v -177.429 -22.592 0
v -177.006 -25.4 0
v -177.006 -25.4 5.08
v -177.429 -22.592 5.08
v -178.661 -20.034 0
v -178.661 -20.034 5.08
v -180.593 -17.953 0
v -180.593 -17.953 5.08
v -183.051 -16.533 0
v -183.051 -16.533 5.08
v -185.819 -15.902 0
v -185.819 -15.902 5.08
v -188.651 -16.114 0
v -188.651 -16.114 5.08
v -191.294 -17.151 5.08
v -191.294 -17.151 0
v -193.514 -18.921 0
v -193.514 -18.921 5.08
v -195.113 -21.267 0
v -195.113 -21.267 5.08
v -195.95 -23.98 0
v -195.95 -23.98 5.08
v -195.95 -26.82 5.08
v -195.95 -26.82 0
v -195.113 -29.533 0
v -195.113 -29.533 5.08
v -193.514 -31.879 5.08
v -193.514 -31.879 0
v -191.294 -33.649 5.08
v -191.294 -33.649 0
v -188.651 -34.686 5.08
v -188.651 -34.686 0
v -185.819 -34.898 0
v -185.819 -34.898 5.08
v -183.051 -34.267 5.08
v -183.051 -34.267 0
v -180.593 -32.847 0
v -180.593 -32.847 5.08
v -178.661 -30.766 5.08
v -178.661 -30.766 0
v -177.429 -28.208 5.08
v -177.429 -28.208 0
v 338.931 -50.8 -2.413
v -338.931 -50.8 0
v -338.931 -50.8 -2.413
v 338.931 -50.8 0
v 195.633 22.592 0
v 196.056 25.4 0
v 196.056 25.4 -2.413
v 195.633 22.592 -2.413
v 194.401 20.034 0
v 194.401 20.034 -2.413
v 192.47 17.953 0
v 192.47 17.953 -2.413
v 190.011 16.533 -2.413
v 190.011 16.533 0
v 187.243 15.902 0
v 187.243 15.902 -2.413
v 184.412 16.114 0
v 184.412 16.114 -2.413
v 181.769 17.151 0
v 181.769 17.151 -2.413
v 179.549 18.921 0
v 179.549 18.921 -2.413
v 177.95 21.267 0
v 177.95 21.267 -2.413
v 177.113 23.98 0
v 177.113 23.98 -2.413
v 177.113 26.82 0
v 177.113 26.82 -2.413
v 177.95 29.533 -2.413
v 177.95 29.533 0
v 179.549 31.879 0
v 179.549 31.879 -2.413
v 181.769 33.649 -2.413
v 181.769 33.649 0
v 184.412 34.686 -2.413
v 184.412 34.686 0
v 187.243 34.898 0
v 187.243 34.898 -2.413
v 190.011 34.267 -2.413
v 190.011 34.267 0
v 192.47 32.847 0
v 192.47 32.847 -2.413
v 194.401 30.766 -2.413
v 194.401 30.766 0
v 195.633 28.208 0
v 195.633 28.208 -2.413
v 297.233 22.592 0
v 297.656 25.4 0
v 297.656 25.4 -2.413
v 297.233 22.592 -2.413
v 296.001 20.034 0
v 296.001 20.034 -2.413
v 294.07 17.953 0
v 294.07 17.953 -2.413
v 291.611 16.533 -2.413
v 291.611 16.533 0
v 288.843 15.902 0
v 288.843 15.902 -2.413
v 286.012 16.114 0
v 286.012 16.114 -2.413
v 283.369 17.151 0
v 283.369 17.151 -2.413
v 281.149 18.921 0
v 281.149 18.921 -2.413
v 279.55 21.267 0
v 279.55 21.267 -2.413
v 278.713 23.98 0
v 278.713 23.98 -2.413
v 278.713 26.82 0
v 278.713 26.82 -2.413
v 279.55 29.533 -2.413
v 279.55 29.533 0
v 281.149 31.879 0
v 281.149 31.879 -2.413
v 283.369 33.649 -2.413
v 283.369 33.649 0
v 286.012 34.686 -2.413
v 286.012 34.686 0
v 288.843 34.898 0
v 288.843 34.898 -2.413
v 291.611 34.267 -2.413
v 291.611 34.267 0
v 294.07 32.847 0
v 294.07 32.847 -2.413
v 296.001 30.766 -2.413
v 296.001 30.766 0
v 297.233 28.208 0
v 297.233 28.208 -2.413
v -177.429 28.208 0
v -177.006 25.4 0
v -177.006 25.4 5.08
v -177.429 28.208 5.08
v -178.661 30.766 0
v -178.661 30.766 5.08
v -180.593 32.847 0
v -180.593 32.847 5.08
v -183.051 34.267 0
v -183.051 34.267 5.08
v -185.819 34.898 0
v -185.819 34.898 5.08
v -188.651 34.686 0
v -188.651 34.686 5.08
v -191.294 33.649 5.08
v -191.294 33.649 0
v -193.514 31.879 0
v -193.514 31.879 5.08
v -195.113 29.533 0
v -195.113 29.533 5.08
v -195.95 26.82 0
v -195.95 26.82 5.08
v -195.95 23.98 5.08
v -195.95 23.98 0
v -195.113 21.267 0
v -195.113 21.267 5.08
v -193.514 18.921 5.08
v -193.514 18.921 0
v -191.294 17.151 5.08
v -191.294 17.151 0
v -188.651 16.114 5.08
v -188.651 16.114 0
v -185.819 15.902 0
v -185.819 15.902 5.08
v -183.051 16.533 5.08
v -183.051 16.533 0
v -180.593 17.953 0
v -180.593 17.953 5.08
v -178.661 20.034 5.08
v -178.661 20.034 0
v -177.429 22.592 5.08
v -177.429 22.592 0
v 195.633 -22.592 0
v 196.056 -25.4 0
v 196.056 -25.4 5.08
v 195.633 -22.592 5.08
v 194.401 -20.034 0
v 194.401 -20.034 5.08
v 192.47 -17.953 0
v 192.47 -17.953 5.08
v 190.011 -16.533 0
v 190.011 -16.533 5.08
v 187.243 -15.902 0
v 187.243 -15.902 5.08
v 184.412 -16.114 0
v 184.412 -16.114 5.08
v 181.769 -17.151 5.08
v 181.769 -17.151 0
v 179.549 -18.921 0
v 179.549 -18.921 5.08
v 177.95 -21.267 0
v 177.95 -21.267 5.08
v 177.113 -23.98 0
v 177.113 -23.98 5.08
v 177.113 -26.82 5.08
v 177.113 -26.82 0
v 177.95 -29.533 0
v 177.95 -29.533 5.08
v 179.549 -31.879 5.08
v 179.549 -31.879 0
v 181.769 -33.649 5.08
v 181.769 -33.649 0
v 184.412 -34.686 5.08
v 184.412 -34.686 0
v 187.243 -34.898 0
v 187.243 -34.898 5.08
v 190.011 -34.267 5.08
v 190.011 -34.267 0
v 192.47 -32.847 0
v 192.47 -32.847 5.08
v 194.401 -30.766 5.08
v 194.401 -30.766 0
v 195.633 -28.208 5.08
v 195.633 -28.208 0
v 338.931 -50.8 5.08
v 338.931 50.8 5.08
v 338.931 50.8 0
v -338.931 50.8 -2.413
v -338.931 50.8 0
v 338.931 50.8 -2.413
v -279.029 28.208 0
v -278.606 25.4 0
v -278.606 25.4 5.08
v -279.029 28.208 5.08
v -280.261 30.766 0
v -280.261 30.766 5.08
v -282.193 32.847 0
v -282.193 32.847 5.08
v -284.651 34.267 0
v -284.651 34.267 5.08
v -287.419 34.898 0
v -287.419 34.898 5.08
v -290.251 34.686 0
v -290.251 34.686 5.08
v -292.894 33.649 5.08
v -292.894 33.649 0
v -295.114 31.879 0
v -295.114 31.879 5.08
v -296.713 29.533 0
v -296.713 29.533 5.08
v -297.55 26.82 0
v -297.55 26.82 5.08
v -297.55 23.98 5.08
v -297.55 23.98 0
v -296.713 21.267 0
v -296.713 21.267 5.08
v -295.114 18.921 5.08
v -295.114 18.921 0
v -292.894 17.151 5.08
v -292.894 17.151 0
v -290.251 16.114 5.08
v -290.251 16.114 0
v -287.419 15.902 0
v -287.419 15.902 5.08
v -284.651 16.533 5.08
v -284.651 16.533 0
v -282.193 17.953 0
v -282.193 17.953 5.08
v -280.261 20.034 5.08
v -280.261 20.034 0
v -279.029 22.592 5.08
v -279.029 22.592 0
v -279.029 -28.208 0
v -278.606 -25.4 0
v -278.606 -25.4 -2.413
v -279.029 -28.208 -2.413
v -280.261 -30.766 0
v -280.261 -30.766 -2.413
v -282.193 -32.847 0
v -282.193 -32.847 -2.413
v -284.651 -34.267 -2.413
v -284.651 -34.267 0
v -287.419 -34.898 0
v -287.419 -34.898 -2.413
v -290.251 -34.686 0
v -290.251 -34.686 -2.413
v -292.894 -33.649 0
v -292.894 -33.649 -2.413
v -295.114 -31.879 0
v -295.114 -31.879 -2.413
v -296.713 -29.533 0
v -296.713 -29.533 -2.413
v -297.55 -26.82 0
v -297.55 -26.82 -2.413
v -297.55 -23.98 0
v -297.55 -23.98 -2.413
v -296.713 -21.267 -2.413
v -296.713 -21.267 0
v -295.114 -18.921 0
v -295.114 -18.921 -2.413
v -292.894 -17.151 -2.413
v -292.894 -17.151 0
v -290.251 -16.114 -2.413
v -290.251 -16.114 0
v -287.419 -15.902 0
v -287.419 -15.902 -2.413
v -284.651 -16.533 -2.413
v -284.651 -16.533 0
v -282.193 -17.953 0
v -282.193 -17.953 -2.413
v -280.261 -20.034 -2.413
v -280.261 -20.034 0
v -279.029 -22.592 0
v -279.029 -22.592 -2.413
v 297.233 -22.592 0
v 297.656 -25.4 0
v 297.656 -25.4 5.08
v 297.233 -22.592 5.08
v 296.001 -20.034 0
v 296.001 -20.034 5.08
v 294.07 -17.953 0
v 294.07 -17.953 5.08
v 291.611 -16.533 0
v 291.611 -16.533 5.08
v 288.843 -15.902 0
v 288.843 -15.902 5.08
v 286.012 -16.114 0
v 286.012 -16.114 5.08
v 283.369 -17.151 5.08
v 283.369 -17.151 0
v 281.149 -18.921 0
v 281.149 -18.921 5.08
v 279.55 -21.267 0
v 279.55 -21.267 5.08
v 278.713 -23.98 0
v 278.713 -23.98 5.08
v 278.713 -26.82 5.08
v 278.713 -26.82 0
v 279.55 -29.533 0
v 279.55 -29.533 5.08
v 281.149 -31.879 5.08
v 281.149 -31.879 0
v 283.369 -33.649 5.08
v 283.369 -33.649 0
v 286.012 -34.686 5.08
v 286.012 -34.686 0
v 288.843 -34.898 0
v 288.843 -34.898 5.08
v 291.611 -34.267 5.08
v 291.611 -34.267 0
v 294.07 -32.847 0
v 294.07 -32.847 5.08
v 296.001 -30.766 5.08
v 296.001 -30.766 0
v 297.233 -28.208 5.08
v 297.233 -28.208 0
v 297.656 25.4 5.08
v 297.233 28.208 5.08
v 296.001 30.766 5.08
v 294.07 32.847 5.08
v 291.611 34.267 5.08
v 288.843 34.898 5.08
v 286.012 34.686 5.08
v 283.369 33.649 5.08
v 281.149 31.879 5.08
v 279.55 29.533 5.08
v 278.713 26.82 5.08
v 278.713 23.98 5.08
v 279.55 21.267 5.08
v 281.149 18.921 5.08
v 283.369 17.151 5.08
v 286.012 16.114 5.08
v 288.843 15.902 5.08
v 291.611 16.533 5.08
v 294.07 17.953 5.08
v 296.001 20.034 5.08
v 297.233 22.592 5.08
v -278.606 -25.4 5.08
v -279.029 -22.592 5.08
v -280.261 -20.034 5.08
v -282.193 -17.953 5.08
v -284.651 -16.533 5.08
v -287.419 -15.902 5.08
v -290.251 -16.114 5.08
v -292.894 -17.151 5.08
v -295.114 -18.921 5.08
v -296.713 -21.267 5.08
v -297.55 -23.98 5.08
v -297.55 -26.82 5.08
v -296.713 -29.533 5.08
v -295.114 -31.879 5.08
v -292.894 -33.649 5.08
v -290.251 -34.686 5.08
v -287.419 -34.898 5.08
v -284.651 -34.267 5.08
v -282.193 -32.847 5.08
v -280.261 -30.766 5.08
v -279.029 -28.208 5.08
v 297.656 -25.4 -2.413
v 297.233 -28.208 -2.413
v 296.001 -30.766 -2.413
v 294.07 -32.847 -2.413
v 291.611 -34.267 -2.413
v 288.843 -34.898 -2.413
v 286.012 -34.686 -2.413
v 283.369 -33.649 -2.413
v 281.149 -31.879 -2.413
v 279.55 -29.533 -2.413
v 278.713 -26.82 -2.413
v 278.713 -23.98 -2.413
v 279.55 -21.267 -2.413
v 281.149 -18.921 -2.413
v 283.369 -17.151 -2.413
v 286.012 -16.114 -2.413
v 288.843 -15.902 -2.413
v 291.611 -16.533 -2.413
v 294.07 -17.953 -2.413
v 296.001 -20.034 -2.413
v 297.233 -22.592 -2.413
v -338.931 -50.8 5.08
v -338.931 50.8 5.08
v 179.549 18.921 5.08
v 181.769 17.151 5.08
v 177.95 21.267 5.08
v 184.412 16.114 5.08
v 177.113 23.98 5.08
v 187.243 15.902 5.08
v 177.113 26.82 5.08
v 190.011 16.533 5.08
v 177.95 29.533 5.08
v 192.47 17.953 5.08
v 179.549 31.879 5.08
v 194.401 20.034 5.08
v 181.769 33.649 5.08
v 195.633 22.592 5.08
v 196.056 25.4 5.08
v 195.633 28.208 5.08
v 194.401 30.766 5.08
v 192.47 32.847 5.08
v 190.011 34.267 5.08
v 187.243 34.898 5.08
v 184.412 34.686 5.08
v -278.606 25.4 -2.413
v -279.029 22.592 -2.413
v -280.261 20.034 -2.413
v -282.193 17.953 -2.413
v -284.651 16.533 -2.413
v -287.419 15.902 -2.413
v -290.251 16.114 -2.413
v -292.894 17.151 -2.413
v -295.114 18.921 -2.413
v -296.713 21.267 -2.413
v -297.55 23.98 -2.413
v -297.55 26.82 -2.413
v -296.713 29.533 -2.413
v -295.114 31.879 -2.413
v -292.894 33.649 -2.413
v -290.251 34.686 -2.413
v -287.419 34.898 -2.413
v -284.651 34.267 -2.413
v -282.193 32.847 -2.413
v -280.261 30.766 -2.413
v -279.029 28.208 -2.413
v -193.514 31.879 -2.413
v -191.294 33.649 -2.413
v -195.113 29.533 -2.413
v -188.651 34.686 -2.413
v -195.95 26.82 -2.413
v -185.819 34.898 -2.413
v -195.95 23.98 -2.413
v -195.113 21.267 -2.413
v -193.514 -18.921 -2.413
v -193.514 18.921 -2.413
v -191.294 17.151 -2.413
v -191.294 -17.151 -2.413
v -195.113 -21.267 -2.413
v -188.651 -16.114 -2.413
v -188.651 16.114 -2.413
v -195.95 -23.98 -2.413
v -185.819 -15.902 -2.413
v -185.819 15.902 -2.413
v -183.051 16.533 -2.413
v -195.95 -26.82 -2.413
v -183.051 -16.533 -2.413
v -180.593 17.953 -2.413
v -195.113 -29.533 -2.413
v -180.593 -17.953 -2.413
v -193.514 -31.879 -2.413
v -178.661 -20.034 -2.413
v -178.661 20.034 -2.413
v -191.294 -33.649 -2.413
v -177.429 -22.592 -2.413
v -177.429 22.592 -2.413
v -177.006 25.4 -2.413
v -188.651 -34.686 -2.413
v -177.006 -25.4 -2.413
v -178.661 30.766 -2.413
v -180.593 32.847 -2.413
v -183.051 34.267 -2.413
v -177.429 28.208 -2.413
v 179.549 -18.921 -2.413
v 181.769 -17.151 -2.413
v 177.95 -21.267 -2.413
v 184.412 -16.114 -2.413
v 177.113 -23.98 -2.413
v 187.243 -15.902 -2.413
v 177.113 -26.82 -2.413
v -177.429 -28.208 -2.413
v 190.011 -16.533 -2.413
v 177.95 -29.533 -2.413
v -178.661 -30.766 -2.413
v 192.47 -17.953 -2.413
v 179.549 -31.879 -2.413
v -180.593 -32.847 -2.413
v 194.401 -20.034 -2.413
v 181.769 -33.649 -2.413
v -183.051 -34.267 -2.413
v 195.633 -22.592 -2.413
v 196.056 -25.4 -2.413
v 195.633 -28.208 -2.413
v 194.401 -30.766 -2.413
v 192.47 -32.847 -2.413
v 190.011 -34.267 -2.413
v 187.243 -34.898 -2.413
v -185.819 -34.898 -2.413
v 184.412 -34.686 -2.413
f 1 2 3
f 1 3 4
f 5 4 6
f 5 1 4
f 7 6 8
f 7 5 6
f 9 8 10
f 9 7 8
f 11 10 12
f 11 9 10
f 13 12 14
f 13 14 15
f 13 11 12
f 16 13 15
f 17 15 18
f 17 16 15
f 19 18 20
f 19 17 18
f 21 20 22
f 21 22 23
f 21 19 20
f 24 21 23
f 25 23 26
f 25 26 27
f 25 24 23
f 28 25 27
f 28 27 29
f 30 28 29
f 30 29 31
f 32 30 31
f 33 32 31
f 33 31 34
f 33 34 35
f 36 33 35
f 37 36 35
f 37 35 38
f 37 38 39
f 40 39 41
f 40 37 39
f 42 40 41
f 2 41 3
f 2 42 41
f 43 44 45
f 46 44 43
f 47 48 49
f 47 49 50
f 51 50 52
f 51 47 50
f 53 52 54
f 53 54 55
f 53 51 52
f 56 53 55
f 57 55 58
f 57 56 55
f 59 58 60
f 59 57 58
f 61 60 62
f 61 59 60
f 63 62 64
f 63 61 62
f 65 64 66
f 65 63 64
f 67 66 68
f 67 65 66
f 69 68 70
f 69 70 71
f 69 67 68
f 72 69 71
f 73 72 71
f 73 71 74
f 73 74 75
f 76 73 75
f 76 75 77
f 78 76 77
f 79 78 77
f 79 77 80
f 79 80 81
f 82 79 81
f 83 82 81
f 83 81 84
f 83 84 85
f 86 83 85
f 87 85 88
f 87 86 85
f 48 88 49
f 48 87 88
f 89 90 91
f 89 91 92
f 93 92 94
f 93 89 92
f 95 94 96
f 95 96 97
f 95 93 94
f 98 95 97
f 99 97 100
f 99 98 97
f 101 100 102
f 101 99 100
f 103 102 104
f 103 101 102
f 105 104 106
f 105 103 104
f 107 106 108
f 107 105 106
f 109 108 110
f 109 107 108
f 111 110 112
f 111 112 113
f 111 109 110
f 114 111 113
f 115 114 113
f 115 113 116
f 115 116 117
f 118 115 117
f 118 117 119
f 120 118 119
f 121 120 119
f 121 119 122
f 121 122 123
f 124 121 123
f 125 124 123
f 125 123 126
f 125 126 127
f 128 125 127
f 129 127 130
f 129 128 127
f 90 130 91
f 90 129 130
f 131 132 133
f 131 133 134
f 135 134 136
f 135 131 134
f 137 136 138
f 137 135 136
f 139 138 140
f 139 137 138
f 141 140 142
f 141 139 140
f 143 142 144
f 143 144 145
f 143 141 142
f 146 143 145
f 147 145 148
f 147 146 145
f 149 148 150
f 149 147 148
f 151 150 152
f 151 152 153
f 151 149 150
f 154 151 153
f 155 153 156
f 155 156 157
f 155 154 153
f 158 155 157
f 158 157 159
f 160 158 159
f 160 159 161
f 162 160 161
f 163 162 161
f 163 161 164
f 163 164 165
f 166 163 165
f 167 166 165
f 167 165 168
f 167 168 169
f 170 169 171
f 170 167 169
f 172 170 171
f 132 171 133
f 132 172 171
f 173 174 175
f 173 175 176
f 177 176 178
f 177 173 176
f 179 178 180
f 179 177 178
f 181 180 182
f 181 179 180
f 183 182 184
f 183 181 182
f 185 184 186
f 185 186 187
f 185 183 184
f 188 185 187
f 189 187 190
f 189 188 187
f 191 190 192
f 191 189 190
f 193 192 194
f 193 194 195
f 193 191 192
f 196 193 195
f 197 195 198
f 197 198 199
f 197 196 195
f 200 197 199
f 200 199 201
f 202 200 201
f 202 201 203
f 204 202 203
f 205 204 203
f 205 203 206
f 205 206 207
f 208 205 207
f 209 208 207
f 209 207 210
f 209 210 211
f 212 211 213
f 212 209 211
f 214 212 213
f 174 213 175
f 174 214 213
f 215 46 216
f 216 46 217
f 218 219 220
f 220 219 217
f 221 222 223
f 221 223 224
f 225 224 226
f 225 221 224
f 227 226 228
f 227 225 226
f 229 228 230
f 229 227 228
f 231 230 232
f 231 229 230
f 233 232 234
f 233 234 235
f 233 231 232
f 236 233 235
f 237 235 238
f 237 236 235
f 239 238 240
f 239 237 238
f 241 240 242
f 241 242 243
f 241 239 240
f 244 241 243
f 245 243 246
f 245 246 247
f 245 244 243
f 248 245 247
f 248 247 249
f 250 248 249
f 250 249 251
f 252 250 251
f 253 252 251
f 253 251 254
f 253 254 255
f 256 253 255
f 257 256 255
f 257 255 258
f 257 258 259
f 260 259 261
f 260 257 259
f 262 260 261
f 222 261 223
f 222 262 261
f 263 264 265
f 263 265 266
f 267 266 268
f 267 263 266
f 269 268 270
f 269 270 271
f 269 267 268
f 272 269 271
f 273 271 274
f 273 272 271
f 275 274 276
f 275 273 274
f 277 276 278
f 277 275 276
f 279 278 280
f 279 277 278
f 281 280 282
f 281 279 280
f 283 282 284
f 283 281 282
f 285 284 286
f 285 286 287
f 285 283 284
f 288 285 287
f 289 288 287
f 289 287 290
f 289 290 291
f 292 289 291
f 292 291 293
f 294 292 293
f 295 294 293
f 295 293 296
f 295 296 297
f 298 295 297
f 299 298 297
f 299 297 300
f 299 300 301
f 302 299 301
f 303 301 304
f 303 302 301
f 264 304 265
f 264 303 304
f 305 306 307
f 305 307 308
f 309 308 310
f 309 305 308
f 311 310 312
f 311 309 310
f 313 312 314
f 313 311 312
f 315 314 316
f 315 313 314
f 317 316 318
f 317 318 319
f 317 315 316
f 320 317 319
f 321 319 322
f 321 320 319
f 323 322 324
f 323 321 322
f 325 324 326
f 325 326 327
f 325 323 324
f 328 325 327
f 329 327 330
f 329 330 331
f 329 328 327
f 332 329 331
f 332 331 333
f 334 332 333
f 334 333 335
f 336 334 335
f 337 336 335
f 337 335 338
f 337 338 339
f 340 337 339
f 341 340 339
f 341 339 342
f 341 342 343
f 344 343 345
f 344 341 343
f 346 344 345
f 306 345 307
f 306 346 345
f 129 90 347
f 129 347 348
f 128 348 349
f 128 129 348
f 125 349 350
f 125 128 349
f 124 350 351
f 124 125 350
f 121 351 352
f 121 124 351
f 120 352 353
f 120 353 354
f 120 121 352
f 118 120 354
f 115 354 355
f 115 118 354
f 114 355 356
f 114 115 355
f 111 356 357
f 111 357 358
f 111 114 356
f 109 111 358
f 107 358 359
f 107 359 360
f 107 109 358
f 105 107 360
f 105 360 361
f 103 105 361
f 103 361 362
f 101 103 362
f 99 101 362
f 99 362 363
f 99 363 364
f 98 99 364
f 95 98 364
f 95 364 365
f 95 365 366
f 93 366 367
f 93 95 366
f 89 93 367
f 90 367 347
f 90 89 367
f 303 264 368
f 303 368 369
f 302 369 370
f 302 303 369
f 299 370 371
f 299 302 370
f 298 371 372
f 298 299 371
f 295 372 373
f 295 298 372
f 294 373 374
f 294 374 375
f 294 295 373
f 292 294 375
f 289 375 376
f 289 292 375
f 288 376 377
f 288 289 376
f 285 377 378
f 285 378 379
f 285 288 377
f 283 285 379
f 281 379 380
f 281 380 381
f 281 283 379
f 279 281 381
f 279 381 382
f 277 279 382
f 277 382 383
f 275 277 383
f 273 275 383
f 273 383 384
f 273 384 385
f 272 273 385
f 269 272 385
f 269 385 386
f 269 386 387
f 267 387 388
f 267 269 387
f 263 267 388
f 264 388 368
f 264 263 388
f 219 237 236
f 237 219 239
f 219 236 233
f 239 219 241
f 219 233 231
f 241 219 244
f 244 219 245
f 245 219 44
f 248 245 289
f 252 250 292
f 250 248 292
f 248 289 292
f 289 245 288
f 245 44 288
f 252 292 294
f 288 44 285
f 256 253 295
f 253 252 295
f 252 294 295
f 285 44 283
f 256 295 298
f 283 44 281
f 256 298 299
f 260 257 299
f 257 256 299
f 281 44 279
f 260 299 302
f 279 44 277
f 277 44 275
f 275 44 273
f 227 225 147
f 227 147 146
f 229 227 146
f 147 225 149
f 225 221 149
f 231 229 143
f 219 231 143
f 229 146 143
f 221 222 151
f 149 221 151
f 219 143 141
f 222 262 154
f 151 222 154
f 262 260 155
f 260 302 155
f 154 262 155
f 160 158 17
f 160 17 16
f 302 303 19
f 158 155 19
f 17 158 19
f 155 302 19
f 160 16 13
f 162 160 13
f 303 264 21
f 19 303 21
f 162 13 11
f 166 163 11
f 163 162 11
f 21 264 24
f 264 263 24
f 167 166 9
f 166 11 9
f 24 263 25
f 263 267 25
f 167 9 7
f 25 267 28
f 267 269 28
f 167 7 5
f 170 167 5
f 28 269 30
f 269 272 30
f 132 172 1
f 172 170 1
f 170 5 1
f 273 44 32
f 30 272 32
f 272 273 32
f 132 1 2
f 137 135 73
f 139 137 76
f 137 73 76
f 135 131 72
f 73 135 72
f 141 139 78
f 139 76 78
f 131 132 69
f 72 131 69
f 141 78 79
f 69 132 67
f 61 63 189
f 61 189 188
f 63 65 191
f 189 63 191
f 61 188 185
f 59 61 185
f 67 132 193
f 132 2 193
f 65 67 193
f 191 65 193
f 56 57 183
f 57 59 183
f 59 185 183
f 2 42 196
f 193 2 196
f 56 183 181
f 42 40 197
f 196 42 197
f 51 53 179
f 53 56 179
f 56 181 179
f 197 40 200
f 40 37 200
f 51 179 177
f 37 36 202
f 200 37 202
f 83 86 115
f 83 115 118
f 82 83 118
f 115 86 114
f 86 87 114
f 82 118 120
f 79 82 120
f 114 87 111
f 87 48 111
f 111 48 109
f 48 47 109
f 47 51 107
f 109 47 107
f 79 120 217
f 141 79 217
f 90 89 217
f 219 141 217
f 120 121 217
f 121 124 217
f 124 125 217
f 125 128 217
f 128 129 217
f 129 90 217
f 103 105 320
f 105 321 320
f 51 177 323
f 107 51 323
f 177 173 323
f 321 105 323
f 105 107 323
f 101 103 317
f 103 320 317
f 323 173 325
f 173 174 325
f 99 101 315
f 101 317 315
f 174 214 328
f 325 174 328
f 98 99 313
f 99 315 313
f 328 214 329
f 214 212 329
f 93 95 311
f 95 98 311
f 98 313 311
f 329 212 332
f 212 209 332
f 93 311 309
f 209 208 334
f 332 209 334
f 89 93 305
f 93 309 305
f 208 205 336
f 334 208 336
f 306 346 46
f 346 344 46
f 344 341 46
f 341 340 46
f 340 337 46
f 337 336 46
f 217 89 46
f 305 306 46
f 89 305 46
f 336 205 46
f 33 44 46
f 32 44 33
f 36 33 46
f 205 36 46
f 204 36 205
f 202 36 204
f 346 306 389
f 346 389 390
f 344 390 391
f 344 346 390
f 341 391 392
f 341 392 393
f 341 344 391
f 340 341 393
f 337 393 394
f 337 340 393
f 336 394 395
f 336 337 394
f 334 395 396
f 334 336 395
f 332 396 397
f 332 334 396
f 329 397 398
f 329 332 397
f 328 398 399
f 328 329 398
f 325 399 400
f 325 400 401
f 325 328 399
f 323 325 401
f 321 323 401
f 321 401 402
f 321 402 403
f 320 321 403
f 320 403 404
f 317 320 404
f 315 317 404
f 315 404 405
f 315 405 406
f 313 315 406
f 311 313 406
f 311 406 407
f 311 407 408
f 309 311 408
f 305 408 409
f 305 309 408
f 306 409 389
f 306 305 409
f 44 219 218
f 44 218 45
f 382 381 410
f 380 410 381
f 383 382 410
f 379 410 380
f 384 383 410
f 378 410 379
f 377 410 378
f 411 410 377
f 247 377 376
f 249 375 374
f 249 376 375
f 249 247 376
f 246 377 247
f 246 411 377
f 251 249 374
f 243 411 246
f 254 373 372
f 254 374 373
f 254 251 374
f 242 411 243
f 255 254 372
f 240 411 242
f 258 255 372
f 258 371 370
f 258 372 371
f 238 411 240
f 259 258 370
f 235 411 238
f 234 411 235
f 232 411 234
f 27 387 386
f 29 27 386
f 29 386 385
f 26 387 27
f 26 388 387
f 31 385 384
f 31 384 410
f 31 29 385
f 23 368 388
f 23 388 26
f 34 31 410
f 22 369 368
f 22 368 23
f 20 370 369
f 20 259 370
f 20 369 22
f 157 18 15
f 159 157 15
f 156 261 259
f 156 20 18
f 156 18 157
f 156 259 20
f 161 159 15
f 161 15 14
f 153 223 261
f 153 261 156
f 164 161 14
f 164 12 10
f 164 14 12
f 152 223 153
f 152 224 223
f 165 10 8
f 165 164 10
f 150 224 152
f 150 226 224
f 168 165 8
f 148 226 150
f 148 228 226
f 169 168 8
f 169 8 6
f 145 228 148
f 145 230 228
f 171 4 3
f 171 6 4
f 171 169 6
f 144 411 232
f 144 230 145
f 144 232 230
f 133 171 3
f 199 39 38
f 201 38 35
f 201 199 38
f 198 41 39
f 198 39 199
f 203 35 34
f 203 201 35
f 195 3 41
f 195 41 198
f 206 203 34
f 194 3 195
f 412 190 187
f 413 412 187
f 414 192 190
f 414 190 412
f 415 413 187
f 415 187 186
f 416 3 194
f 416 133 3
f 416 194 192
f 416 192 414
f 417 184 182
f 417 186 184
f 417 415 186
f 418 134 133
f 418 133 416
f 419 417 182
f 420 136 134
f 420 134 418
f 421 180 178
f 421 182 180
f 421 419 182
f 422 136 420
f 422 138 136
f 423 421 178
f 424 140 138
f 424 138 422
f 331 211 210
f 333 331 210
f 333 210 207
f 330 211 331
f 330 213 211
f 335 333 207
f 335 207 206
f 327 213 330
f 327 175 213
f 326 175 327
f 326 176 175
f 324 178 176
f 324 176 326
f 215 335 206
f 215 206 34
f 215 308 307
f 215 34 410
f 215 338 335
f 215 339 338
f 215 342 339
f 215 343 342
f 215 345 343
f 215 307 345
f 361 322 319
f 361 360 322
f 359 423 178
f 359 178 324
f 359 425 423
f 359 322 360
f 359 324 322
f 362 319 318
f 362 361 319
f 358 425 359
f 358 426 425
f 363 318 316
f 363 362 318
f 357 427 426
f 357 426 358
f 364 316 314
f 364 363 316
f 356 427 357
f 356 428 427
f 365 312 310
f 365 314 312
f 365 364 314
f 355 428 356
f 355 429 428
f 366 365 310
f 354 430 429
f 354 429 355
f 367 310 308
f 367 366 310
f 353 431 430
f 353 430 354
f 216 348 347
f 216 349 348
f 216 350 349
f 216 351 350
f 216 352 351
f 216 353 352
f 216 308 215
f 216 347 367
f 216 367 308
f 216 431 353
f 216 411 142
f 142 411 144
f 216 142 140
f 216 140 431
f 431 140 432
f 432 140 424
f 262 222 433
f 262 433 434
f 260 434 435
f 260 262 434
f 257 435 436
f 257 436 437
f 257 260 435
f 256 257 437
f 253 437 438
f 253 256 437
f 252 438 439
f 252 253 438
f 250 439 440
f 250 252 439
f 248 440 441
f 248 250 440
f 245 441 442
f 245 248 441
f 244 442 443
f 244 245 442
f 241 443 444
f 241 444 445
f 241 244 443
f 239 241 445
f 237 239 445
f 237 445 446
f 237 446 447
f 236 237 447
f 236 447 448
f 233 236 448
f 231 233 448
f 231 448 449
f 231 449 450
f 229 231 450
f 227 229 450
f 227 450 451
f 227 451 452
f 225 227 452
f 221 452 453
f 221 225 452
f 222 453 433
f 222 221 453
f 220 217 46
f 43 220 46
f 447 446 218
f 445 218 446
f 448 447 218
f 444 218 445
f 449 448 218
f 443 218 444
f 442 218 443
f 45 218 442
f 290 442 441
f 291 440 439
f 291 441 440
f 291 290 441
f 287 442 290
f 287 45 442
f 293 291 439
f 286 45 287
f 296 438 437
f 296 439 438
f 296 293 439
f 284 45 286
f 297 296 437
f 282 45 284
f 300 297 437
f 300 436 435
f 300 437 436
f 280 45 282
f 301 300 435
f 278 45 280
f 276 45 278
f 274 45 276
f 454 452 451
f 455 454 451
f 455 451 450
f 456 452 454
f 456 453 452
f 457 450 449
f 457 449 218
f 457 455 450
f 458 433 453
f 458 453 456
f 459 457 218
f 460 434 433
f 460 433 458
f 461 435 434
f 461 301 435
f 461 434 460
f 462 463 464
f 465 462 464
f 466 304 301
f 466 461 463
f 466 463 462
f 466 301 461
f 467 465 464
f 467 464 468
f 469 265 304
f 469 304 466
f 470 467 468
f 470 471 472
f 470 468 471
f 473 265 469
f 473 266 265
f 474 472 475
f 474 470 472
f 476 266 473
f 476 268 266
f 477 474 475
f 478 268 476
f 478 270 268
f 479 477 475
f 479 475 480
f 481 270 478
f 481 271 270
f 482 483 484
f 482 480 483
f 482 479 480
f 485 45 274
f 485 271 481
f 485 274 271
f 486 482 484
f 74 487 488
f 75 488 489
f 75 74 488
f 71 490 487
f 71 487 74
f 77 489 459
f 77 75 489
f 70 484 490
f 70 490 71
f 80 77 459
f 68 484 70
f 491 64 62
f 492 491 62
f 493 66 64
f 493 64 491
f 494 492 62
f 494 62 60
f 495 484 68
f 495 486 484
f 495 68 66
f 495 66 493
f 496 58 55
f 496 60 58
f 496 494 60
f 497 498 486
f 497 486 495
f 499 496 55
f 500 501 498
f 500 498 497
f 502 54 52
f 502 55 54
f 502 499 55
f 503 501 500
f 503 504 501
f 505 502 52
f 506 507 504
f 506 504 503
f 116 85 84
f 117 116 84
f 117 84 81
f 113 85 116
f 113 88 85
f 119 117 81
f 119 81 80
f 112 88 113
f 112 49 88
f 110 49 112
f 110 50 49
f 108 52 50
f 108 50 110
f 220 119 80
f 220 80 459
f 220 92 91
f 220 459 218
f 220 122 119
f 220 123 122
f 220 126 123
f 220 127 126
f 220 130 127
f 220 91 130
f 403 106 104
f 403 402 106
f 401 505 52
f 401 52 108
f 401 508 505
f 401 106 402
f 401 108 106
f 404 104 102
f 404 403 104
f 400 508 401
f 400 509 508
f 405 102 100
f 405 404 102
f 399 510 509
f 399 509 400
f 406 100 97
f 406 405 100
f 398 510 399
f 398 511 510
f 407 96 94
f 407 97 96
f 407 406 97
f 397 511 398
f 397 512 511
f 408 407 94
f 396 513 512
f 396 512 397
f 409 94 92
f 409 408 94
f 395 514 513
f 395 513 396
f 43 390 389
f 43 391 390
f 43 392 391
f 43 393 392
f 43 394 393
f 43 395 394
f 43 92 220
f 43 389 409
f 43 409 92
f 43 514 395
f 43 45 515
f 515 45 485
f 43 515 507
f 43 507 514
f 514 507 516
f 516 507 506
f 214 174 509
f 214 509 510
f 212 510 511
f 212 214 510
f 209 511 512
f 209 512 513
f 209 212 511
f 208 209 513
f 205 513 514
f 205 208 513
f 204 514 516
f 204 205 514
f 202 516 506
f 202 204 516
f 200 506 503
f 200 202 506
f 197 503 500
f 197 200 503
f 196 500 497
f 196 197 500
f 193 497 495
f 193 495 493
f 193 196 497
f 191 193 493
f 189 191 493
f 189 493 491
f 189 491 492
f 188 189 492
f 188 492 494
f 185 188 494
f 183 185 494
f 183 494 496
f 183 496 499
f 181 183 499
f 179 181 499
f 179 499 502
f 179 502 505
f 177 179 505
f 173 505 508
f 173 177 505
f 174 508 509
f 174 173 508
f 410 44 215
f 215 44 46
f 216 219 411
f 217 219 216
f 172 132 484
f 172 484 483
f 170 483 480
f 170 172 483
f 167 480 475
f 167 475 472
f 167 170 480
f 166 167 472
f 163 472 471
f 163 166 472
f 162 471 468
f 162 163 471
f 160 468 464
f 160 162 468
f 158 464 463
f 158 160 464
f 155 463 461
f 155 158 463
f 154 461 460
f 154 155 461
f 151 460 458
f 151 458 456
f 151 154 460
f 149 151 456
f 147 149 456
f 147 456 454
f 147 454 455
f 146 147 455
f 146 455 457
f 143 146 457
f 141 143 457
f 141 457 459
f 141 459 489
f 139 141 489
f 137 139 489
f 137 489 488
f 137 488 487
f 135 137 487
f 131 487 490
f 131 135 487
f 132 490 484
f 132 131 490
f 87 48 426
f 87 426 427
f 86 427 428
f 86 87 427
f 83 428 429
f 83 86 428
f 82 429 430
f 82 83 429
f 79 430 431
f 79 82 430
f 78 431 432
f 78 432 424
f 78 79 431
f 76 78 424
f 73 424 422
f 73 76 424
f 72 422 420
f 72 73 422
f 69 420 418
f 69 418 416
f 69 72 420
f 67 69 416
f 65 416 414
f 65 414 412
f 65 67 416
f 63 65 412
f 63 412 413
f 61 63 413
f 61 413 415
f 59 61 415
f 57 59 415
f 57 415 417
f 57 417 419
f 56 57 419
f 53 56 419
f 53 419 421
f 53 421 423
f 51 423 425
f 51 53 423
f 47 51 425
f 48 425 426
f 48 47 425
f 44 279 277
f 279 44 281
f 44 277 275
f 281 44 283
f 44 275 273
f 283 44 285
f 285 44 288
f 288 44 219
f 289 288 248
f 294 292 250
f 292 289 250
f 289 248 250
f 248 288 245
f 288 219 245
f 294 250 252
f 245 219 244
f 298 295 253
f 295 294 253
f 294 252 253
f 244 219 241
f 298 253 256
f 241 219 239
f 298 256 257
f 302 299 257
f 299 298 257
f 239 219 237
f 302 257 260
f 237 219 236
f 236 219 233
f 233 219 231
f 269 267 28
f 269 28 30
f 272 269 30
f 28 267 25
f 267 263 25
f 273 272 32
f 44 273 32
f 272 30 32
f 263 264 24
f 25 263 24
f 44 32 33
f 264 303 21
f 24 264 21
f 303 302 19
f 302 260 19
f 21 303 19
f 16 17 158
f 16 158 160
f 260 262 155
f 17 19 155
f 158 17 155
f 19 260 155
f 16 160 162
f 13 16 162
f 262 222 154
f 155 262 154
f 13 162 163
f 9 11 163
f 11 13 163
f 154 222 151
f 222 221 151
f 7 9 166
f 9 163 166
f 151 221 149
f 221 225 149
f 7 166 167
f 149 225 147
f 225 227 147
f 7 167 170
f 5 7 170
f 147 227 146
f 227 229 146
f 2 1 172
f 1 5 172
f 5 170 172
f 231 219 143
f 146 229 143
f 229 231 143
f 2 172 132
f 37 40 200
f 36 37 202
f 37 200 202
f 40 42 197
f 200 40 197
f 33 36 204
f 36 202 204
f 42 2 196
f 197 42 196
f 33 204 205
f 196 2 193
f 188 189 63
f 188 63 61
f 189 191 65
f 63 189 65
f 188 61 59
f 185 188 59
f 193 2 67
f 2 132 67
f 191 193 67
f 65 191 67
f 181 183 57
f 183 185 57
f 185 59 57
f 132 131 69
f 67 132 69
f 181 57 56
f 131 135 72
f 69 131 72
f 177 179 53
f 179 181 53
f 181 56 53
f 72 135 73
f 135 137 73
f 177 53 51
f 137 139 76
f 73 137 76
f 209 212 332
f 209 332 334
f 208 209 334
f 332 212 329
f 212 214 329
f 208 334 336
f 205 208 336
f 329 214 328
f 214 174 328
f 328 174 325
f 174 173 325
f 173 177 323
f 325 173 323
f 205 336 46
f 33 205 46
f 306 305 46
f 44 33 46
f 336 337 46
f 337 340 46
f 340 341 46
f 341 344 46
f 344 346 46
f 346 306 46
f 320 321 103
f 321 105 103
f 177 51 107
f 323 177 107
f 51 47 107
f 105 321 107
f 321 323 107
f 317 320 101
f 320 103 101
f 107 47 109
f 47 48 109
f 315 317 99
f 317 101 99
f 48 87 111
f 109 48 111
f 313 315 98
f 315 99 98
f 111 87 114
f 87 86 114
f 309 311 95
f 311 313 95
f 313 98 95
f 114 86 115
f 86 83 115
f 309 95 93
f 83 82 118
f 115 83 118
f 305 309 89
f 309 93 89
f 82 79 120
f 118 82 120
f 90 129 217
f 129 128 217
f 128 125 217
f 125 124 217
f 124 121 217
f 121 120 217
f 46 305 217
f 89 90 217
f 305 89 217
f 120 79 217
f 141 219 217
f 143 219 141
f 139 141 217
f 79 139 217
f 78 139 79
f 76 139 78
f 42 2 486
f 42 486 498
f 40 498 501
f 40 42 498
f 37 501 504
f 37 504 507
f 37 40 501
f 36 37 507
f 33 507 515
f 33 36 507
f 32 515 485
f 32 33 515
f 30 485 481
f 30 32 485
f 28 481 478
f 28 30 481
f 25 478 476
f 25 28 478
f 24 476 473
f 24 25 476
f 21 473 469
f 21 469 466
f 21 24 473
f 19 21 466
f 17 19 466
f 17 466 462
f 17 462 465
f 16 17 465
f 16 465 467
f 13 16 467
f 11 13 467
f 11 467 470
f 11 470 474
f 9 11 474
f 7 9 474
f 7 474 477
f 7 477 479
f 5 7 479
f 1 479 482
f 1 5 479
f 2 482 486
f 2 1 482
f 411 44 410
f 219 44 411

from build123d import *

# Parameters (mm, degrees)
F0_W     = 677.8625
F0_H     = 101.6
F0_R     = 9.525
F1_DEPTH = 5.08
F2_W     = 677.8625
F2_H     = 101.6
F2_R     = 9.525
F3_DEPTH = 2.413


with BuildPart() as f1:
    # F0 (on Top) → F1 (new body)
    with BuildSketch(Plane.XY):
        Rectangle(F0_W, F0_H)
        with Locations((-288.13125, -25.4)):
            Circle(F0_R, mode=Mode.SUBTRACT)
        with Locations((-186.53125, -25.4)):
            Circle(F0_R, mode=Mode.SUBTRACT)
        with Locations((186.53125, -25.4)):
            Circle(F0_R, mode=Mode.SUBTRACT)
        with Locations((288.13125, -25.4)):
            Circle(F0_R, mode=Mode.SUBTRACT)
        with Locations((-288.13125, 25.4)):
            Circle(F0_R, mode=Mode.SUBTRACT)
        with Locations((-186.53125, 25.4)):
            Circle(F0_R, mode=Mode.SUBTRACT)
        with Locations((186.53125, 25.4)):
            Circle(F0_R, mode=Mode.SUBTRACT)
        with Locations((288.13125, 25.4)):
            Circle(F0_R, mode=Mode.SUBTRACT)
    extrude(amount=F1_DEPTH)


with BuildPart() as f3:
    # F2 (on face) → F3 (new body)
    with BuildSketch(Plane(origin=(0, 0, 0), x_dir=(1, 0, 0), z_dir=(0, 0, -1))):
        Rectangle(F2_W, F2_H)
        with Locations((-288.13125, -25.4)):
            Circle(F2_R, mode=Mode.SUBTRACT)
        with Locations((-186.53125, -25.4)):
            Circle(F2_R, mode=Mode.SUBTRACT)
        with Locations((186.53125, -25.4)):
            Circle(F2_R, mode=Mode.SUBTRACT)
        with Locations((288.13125, -25.4)):
            Circle(F2_R, mode=Mode.SUBTRACT)
        with Locations((-288.13125, 25.4)):
            Circle(F2_R, mode=Mode.SUBTRACT)
        with Locations((-186.53125, 25.4)):
            Circle(F2_R, mode=Mode.SUBTRACT)
        with Locations((186.53125, 25.4)):
            Circle(F2_R, mode=Mode.SUBTRACT)
        with Locations((288.13125, 25.4)):
            Circle(F2_R, mode=Mode.SUBTRACT)
    extrude(amount=F3_DEPTH)


solid = Compound([f1.part, f3.part])
